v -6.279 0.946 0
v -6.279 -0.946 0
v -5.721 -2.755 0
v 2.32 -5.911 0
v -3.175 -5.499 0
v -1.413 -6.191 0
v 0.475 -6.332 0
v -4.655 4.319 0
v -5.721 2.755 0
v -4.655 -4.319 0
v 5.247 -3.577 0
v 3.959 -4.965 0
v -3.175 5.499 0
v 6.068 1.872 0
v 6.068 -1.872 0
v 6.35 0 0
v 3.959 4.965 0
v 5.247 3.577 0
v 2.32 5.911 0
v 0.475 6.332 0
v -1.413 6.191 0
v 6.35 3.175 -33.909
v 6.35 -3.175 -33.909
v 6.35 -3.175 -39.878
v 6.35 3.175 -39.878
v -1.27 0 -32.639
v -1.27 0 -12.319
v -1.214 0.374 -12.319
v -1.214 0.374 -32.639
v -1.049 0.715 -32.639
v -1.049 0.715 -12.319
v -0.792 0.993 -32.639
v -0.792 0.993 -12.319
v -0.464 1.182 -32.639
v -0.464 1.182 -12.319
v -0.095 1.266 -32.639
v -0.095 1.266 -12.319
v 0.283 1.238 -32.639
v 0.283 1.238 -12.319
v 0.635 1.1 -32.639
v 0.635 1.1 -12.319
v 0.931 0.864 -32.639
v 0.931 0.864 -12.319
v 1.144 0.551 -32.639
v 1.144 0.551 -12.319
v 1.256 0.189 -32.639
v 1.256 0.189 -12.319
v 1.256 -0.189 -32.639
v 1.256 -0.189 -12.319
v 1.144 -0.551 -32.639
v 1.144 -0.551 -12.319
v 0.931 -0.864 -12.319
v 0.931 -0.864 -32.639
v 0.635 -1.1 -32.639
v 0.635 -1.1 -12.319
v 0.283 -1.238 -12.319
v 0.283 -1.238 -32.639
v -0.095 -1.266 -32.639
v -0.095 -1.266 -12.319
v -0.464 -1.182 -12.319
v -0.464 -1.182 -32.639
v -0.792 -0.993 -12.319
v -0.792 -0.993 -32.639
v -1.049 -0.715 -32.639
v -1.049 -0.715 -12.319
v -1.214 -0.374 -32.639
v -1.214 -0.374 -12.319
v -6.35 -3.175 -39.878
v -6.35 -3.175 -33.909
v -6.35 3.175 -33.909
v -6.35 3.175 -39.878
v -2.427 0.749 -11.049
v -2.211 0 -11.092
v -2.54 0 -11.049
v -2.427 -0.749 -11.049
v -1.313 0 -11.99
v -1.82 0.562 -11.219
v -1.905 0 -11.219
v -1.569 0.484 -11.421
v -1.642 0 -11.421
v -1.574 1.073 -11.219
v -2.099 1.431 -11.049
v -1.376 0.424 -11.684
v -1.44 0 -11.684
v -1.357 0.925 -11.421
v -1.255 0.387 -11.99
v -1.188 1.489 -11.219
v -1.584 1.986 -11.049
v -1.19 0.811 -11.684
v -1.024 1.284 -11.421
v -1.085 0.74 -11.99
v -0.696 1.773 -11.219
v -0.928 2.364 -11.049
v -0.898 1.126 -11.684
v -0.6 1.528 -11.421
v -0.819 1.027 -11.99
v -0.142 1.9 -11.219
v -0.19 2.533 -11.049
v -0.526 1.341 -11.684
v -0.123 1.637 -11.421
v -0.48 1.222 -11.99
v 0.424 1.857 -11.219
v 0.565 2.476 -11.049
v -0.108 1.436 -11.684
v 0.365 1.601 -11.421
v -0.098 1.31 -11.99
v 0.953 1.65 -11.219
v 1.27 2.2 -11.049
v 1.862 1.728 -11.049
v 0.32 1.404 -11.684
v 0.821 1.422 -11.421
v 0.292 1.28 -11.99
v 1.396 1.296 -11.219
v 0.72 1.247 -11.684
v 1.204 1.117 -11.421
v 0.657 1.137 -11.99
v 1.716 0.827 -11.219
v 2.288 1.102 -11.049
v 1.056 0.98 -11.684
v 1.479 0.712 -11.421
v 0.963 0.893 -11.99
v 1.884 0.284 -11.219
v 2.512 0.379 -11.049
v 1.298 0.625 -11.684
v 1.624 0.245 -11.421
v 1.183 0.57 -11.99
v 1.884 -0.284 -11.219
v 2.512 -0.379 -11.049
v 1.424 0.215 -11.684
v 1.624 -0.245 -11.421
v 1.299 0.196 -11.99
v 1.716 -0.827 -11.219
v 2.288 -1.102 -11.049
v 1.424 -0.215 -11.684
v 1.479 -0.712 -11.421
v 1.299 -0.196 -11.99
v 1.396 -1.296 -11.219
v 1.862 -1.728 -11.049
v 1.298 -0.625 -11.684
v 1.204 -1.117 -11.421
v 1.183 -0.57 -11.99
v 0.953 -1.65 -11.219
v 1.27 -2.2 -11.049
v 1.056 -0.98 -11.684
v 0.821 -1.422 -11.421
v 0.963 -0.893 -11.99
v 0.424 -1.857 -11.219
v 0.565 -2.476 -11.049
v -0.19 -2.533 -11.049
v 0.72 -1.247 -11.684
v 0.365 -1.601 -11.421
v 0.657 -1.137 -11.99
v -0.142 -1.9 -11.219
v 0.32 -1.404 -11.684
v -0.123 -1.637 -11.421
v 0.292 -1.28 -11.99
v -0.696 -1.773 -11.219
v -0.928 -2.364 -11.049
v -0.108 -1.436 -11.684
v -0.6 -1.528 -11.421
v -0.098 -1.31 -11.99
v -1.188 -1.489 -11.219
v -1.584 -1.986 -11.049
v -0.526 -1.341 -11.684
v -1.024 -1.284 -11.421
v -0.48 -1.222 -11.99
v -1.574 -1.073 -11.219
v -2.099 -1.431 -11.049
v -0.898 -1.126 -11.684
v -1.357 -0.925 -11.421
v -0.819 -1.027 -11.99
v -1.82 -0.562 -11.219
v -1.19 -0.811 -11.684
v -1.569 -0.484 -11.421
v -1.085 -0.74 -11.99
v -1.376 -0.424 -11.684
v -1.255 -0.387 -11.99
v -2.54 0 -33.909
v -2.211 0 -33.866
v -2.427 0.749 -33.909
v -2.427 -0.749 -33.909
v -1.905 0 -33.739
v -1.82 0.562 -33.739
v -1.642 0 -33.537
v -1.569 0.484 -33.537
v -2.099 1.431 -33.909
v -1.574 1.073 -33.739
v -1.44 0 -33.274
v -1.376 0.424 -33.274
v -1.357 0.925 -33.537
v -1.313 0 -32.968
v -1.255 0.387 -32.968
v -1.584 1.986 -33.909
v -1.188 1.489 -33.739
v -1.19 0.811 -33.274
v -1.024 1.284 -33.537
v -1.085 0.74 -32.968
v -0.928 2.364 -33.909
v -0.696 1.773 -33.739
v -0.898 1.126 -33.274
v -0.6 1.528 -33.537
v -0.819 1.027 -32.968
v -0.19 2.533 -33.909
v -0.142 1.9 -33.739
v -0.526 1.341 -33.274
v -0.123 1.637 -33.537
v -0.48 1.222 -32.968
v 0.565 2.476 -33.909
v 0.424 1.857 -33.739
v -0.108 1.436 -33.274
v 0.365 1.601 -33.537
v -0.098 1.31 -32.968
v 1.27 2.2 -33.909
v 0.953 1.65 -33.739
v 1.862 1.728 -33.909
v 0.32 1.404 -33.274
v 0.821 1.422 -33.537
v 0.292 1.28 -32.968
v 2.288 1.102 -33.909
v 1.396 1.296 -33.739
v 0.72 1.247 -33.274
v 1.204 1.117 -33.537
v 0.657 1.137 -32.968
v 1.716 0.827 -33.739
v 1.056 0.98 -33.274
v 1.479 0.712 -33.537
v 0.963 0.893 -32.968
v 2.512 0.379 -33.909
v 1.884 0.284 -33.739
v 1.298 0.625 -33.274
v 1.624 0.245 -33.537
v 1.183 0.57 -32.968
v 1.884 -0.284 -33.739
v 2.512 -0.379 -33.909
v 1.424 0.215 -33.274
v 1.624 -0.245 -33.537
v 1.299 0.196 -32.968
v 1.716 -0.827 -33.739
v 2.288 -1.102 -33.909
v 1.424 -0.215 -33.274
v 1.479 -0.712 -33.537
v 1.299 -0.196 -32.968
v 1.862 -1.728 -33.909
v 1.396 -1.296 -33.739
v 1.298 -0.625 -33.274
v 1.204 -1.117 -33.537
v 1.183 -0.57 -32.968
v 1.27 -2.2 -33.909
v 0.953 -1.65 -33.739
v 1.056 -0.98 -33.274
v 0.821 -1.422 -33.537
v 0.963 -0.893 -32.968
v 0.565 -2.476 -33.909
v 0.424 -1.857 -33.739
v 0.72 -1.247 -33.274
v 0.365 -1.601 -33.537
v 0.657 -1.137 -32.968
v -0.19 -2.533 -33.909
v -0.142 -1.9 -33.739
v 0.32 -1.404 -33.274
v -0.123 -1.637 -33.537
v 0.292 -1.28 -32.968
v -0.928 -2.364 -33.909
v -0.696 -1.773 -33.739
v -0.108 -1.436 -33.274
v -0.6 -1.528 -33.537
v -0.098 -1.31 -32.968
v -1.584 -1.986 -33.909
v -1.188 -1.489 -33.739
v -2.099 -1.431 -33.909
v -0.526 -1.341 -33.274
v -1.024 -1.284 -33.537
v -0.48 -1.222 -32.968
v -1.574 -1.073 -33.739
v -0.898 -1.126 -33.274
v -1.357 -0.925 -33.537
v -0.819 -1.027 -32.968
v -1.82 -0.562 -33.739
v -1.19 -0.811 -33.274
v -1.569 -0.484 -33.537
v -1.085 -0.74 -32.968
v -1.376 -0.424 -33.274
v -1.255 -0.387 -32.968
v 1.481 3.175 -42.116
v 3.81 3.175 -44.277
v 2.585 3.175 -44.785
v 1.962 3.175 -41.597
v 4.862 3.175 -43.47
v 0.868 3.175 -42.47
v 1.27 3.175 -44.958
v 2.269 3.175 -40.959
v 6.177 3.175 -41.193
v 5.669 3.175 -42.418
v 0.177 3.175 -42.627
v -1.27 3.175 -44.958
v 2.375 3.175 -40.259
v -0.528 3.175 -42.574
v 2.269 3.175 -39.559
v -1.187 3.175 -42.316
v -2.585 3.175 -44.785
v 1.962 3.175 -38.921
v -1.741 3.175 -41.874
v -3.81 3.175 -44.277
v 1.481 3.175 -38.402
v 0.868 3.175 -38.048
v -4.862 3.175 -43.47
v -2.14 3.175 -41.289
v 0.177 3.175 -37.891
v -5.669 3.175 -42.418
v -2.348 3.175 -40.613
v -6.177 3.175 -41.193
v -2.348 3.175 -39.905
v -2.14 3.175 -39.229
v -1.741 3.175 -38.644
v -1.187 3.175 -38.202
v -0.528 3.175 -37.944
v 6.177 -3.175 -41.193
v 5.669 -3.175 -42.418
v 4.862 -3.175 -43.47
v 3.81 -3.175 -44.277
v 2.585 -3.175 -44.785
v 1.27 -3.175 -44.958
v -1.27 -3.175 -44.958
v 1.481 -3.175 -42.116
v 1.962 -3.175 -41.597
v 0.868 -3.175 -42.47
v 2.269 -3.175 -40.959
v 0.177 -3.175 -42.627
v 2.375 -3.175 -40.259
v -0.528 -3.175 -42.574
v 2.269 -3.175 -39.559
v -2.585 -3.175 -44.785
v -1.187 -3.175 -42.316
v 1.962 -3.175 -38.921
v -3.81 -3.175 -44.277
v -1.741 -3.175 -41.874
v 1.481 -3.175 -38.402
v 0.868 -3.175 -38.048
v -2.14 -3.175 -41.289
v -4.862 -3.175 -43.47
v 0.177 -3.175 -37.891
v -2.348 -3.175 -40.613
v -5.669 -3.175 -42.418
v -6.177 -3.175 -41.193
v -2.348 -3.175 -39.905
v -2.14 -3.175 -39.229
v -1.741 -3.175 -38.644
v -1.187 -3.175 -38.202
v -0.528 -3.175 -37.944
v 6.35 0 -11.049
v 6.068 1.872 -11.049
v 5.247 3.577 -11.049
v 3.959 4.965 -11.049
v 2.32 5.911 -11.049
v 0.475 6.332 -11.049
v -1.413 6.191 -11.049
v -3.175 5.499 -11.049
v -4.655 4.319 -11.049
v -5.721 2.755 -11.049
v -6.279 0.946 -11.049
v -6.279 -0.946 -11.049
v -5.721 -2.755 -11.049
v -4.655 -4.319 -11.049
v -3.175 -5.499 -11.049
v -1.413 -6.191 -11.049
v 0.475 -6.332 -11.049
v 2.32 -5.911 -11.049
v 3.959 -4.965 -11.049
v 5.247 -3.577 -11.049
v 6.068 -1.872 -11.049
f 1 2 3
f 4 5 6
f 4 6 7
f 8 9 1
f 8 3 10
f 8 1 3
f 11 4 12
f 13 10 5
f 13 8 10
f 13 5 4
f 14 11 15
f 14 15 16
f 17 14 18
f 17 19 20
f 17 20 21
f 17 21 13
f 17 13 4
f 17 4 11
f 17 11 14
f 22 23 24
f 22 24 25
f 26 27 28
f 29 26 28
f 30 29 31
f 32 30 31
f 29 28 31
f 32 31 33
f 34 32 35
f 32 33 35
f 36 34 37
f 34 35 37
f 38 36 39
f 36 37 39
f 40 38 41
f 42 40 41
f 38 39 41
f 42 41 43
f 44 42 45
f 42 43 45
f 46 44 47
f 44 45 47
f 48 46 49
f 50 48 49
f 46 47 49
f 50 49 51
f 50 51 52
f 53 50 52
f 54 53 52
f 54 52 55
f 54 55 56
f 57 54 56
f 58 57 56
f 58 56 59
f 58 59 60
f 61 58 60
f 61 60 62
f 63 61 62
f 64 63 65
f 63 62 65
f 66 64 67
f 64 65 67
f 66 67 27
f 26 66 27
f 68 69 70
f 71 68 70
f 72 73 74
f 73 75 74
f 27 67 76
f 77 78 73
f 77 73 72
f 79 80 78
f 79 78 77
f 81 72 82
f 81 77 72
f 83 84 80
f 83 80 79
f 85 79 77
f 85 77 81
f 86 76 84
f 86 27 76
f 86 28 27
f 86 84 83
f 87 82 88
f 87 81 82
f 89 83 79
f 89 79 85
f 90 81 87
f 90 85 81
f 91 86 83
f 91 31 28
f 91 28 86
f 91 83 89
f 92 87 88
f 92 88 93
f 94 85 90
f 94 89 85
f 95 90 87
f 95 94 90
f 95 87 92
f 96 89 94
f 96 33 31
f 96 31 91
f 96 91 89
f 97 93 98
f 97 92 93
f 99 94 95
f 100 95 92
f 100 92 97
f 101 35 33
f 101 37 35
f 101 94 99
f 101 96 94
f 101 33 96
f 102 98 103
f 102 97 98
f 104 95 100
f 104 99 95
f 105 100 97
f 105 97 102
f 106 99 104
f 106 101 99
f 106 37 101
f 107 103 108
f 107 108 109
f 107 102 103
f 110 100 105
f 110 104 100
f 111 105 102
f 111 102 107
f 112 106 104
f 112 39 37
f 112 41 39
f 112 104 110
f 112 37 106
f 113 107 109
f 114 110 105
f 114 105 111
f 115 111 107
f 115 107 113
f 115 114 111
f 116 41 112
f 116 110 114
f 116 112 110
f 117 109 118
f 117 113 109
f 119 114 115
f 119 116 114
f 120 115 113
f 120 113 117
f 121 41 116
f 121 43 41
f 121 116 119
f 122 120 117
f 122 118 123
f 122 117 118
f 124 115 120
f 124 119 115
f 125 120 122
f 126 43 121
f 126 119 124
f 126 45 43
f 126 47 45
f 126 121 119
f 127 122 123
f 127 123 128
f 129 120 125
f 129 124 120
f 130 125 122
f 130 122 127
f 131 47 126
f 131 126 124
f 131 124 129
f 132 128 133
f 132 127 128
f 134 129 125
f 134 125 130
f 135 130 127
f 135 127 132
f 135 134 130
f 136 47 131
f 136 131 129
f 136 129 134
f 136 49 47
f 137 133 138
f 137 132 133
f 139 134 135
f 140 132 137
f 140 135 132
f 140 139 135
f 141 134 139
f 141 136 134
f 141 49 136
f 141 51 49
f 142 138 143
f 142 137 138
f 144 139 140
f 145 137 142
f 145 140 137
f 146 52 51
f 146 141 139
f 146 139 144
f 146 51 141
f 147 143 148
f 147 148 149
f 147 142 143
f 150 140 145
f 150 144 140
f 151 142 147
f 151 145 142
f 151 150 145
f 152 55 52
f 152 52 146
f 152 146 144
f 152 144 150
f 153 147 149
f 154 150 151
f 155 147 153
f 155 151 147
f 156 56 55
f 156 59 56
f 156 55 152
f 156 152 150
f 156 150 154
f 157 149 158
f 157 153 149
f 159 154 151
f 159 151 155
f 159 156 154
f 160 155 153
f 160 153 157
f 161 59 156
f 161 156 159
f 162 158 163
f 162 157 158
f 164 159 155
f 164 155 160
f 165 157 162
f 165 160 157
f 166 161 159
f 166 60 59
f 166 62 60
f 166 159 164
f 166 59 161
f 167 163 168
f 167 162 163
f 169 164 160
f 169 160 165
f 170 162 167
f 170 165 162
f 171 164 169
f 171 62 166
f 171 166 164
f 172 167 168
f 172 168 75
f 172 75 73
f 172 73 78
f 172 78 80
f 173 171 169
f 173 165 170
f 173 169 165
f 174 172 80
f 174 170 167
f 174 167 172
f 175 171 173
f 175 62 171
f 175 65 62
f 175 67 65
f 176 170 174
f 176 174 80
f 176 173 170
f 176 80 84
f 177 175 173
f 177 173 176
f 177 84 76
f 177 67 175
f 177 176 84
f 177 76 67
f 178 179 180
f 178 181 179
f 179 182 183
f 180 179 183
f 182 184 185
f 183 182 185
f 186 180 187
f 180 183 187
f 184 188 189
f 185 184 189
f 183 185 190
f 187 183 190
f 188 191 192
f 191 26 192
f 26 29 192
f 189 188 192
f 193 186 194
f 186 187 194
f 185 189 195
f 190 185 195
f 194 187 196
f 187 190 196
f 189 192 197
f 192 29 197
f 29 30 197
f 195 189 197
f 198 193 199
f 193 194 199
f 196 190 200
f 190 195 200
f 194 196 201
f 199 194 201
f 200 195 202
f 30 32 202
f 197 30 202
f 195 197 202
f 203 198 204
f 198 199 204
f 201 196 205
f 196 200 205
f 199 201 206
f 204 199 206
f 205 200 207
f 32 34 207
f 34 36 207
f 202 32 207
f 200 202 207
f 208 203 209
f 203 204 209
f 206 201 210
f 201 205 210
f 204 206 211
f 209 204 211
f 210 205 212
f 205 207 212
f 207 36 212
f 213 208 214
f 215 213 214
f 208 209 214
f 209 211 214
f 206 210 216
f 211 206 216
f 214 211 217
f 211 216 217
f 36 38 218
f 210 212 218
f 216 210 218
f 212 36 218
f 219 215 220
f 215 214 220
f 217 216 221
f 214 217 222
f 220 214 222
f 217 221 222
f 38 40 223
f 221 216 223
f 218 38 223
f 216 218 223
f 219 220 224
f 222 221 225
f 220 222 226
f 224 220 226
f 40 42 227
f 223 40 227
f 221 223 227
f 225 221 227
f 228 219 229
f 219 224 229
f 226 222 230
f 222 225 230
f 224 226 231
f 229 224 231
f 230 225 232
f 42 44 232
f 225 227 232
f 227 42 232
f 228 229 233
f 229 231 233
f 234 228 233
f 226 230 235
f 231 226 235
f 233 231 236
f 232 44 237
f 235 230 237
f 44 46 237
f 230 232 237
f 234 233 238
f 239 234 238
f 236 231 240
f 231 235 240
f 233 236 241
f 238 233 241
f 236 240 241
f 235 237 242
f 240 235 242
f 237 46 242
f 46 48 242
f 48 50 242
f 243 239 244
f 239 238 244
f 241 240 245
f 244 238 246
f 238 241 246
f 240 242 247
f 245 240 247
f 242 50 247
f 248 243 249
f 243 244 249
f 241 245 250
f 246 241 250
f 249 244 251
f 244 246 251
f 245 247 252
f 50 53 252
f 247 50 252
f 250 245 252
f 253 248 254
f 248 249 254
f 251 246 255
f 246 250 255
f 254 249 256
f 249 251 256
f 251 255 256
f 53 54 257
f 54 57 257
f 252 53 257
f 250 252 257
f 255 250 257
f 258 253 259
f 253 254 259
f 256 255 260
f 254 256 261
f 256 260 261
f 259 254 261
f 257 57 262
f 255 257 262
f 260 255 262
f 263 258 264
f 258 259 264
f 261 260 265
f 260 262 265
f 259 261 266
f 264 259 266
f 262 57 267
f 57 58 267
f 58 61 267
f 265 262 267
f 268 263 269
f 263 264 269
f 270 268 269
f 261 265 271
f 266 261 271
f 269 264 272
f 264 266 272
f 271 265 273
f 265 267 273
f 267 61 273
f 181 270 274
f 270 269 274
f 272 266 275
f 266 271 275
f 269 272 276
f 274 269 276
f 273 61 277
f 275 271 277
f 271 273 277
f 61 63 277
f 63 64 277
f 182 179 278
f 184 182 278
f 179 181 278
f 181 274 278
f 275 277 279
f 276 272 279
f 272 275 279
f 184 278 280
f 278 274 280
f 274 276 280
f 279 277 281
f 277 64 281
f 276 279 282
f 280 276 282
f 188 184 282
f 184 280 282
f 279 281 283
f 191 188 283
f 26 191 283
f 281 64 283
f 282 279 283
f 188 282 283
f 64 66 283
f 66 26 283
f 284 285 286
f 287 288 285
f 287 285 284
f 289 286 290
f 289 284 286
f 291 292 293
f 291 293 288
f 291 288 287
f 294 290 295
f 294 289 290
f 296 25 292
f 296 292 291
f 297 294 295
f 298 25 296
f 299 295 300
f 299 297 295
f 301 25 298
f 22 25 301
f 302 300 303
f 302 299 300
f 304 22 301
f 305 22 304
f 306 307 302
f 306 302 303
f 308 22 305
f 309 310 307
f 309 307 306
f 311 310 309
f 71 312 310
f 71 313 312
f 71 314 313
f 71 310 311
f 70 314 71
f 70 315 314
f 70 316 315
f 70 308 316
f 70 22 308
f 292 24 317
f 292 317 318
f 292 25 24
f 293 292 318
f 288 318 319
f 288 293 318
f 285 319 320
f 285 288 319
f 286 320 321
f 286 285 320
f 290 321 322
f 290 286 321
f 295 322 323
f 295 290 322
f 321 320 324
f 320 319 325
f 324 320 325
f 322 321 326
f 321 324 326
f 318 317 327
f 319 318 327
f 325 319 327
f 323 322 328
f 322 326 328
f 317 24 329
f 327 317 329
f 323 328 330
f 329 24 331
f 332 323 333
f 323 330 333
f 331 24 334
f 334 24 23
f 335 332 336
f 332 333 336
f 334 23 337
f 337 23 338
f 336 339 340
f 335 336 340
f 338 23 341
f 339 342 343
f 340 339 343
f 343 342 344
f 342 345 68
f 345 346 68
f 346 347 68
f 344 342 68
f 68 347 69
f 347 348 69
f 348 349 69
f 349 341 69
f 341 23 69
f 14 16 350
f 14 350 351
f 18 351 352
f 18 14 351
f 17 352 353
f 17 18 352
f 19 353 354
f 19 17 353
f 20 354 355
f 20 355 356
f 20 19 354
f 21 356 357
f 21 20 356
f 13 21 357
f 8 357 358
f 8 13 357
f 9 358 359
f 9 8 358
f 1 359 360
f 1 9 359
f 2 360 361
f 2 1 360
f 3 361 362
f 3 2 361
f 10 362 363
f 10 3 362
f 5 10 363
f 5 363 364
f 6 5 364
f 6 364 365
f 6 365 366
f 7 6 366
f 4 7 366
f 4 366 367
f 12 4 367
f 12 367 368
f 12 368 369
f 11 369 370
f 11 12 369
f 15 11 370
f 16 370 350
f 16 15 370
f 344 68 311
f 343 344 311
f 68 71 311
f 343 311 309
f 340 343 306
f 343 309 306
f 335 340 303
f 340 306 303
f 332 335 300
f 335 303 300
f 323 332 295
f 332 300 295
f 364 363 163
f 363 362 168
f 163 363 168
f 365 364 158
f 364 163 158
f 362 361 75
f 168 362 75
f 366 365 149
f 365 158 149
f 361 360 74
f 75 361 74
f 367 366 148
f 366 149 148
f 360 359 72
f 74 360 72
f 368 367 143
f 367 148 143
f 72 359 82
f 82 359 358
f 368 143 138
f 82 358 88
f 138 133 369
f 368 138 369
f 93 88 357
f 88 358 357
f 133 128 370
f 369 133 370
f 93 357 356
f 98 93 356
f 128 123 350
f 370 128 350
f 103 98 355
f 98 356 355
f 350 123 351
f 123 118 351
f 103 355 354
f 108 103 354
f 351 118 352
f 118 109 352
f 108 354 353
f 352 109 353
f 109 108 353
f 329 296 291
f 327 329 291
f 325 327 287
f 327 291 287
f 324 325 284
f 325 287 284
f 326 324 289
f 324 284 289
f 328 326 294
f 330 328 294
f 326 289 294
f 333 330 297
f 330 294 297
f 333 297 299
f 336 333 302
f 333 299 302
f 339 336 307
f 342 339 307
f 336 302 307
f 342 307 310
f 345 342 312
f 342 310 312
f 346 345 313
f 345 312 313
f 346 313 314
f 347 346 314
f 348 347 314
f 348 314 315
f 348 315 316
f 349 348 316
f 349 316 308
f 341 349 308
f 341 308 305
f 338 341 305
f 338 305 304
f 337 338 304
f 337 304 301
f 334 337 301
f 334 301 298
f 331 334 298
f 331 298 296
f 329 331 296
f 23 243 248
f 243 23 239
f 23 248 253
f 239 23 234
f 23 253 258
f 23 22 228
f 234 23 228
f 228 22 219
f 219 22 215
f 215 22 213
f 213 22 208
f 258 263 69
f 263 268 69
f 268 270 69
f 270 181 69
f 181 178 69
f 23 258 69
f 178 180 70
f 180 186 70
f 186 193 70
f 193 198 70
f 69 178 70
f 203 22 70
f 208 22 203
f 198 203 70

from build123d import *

# Parameters (mm, degrees)
SKETCH1_R           = 6.35
BOSS_EXTRUDE1_DEPTH = 11.049
SKETCH2_R           = 1.27
BOSS_EXTRUDE2_DEPTH = 22.86
FILLET1_R           = 1.27
SKETCH3_W           = 12.7
SKETCH3_H           = 6.35
BOSS_EXTRUDE3_DEPTH = 11.049
FILLET2_R           = 1.27
FILLET3_R           = 5.08
SKETCH4_R           = 2.3749
CUT_EXTRUDE1_DEPTH  = 10.525


with BuildPart() as part:
    # Sketch1 → Boss-Extrude1 (new body)
    with BuildSketch(Plane.XY):
        Circle(SKETCH1_R)
    extrude(amount=-BOSS_EXTRUDE1_DEPTH)

    # Sketch2 → Boss-Extrude2 (add)
    with BuildSketch(Plane(origin=(0, 0, -11.049), x_dir=(-1, 0, 0), z_dir=(0, 0, -1))):
        Circle(SKETCH2_R)
    extrude(amount=BOSS_EXTRUDE2_DEPTH)

    # Fillet1
    fillet1_edges = [part.edges().sort_by_distance(p)[0] for p in [
        (1.27, 0, -11.049),
    ]]
    fillet(fillet1_edges, radius=FILLET1_R)

    # Sketch3 → Boss-Extrude3 (add)
    with BuildSketch(Plane(origin=(0, 0, -33.909), x_dir=(-1, 0, 0), z_dir=(0, 0, -1))):
        Rectangle(SKETCH3_W, SKETCH3_H)
    extrude(amount=BOSS_EXTRUDE3_DEPTH)

    # Fillet2
    fillet2_edges = [part.edges().sort_by_distance(p)[0] for p in [
        (1.27, 0, -33.909),
    ]]
    fillet(fillet2_edges, radius=FILLET2_R)

    # Fillet3
    fillet3_edges = [part.edges().sort_by_distance(p)[0] for p in [
        (6.35, 0, -44.958),
        (-6.35, 0, -44.958),
    ]]
    fillet(fillet3_edges, radius=FILLET3_R)

    # Sketch4 → Cut-Extrude1 (cut, through all)
    with BuildSketch(Plane(origin=(0, 3.175, 0), x_dir=(1, 0, 0), z_dir=(0, 1, 0))):
        with Locations((0, 40.259)):
            Circle(SKETCH4_R)
    extrude(amount=-CUT_EXTRUDE1_DEPTH, mode=Mode.SUBTRACT)


solid = part.part
